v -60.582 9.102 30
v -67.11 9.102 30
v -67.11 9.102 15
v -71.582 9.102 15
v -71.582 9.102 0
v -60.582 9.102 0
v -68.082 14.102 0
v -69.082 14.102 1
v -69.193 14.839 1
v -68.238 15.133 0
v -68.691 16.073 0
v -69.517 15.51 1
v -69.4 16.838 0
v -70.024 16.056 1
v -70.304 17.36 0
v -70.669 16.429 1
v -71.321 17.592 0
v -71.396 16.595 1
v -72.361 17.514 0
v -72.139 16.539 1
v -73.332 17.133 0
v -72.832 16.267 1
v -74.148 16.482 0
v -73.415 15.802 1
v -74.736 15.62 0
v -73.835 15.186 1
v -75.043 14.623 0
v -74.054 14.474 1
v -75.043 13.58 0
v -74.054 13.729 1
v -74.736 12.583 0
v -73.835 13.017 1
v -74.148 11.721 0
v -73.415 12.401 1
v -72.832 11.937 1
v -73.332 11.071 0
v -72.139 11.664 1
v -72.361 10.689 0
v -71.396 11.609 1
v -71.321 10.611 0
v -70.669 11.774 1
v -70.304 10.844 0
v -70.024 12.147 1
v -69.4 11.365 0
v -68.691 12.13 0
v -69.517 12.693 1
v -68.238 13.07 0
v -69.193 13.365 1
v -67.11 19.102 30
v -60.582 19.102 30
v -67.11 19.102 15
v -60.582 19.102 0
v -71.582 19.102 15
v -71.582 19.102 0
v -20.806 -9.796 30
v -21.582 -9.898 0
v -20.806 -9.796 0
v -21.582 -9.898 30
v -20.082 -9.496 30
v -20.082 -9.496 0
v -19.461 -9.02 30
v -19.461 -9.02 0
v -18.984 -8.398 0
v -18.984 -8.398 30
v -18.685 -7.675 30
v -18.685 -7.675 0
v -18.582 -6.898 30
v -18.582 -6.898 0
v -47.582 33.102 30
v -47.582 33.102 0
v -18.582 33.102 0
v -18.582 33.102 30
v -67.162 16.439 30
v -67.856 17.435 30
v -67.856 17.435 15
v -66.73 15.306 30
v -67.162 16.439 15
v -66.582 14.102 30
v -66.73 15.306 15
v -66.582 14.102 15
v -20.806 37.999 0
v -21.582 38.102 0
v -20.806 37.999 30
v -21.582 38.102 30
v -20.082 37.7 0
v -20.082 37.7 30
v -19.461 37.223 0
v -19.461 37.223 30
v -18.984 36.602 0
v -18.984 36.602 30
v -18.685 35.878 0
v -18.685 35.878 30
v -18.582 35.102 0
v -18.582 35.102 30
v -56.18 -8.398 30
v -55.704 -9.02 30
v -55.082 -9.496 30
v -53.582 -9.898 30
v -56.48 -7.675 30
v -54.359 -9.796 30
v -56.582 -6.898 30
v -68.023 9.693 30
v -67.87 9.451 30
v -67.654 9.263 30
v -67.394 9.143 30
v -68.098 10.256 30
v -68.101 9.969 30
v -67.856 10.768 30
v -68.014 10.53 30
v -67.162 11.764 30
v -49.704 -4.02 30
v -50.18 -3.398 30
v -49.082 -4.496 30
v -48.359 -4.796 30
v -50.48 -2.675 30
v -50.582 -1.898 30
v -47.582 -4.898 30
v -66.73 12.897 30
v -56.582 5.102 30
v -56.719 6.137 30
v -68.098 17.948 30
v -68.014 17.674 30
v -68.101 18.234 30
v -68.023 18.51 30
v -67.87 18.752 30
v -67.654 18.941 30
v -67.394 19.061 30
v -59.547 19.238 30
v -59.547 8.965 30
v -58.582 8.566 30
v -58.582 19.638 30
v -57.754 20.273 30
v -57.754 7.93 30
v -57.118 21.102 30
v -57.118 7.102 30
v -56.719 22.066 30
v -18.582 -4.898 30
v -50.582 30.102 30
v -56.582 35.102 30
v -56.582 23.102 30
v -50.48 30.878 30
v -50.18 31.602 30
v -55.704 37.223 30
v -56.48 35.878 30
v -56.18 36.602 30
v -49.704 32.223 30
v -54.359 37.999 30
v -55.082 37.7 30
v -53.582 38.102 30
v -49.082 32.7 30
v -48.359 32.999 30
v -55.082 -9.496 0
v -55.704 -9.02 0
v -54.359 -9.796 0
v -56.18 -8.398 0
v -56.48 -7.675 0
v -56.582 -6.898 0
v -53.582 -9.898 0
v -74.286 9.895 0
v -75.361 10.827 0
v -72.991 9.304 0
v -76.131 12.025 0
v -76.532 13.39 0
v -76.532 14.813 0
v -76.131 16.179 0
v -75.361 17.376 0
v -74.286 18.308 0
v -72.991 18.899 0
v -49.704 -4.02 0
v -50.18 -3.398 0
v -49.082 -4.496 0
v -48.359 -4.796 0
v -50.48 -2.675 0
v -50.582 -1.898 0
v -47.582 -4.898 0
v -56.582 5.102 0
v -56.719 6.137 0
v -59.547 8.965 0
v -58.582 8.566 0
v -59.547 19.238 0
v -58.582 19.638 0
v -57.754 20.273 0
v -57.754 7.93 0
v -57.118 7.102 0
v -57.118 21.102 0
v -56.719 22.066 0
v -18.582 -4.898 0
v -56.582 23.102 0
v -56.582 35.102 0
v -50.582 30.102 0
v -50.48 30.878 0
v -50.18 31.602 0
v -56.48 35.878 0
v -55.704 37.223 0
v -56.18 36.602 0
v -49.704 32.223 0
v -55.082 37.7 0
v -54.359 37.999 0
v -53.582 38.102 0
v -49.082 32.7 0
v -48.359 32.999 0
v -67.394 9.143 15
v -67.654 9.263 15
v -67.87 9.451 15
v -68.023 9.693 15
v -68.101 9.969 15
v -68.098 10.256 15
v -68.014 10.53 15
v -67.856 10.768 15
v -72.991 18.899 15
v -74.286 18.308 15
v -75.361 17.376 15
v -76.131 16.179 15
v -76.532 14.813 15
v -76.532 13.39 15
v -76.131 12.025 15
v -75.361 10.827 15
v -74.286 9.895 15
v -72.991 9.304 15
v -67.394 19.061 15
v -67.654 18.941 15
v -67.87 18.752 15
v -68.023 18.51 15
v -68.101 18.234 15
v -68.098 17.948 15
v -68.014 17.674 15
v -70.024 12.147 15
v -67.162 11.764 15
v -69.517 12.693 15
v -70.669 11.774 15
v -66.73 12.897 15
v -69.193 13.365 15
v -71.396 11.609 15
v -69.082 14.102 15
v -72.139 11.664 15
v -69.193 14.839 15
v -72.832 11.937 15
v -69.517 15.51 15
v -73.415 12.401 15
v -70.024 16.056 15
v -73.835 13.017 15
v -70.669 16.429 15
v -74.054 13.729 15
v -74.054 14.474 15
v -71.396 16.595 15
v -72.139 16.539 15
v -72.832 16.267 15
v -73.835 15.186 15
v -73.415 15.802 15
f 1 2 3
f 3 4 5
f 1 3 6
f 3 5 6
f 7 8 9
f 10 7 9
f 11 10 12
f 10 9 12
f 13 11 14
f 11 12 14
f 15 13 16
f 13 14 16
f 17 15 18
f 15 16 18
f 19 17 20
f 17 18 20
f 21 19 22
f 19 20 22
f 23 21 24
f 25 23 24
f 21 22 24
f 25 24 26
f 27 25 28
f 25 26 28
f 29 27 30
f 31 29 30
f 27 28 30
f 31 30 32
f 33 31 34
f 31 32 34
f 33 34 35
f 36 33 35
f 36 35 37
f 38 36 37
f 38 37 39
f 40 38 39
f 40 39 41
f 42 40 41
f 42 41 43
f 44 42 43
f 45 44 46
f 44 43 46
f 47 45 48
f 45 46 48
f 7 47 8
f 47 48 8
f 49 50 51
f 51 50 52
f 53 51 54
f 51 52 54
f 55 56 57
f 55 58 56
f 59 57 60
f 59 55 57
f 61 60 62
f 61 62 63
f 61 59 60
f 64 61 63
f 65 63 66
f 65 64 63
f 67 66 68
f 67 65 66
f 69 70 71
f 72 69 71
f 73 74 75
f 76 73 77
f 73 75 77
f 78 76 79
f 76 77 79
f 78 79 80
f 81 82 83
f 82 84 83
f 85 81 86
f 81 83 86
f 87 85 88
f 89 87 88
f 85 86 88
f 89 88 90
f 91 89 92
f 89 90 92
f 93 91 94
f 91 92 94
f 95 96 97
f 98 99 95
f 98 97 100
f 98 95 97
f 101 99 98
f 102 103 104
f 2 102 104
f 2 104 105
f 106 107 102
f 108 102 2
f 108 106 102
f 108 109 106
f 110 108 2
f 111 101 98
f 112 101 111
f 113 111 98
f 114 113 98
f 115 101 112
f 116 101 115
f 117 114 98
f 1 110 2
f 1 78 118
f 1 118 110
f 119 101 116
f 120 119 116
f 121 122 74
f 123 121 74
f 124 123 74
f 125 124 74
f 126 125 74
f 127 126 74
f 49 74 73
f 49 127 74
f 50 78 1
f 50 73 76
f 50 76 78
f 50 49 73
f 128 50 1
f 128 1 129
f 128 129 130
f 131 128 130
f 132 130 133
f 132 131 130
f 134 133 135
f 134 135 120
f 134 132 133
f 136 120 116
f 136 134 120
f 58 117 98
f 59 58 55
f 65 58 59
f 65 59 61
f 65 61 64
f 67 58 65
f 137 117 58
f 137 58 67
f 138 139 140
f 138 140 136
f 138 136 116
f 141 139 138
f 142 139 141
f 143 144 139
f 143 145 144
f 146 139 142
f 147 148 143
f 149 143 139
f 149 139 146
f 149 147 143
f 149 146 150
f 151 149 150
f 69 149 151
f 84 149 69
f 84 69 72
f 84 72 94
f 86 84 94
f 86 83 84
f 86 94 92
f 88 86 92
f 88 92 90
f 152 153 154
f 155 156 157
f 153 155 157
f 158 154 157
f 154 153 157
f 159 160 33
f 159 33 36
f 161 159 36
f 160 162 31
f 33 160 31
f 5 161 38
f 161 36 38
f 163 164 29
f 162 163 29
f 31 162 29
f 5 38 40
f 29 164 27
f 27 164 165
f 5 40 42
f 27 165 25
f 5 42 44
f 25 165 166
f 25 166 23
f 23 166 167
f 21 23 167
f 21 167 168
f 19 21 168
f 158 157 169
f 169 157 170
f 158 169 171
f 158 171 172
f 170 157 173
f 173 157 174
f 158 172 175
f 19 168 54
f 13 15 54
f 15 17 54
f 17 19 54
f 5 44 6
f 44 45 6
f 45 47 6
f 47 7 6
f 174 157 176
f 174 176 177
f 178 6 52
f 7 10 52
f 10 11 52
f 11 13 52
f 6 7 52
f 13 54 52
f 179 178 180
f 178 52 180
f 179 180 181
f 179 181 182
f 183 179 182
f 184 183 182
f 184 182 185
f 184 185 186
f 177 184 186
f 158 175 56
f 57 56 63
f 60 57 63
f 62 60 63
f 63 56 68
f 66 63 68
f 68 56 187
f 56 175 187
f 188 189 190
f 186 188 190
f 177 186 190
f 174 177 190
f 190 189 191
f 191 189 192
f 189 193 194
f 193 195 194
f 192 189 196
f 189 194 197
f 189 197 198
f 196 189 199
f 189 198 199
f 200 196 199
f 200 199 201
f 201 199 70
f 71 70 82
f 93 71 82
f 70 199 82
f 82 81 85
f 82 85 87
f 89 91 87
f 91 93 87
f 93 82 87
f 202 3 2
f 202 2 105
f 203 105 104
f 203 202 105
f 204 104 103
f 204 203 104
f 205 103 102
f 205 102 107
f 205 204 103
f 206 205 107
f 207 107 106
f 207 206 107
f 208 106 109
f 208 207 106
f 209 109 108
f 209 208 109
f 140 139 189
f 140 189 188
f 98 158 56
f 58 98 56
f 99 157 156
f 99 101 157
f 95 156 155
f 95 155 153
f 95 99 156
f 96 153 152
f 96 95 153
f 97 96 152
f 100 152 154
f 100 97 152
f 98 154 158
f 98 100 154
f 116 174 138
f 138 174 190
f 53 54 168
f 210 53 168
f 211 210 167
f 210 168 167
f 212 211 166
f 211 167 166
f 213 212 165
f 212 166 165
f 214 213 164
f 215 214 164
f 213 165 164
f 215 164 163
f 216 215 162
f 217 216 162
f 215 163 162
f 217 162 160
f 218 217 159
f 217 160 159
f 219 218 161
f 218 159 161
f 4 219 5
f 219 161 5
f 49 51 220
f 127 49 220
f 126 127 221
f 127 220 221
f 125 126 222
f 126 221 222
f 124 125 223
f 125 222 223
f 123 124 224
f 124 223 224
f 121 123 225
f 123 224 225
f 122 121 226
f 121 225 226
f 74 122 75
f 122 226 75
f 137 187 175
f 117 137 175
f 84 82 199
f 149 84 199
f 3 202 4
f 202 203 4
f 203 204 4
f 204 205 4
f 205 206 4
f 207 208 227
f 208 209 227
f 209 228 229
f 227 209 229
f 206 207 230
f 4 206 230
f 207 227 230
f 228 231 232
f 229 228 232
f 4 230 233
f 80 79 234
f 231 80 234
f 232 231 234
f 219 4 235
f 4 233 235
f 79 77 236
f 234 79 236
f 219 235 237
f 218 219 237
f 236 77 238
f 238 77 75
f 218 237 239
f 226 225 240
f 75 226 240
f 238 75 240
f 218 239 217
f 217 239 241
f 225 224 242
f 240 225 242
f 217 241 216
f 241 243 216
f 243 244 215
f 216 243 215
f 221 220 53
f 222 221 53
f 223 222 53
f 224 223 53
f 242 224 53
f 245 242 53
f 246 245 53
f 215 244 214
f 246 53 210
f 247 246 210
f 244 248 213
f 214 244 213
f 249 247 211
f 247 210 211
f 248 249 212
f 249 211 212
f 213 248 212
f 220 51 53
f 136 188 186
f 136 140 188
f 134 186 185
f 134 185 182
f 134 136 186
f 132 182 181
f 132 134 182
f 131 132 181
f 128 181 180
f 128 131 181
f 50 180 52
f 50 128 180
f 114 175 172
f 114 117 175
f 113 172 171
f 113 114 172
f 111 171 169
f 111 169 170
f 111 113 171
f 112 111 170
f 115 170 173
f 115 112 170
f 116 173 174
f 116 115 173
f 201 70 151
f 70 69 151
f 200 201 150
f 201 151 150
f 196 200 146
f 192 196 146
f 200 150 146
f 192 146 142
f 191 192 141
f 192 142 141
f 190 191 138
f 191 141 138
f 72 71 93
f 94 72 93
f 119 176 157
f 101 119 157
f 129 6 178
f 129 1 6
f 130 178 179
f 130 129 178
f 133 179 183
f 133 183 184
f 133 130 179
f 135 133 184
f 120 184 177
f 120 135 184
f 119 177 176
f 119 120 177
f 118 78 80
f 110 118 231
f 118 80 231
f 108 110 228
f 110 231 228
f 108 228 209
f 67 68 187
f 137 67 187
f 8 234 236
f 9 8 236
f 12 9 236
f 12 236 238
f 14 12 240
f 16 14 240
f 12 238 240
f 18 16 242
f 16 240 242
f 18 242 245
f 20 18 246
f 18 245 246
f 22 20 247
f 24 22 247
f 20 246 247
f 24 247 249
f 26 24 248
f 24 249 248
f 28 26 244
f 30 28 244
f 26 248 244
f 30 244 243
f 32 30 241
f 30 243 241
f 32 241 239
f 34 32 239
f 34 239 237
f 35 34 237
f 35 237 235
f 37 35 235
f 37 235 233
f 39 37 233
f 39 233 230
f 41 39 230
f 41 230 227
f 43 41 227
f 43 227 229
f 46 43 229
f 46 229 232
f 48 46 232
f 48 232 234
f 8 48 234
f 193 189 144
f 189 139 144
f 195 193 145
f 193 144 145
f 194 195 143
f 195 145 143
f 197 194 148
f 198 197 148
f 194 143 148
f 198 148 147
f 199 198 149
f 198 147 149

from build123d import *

# Parameters (mm, degrees)
F1_DEPTH    = 30
F2_DEPTH    = 30
F3_DEPTH    = 15
F4_R        = 2.5
F5_DEPTH    = 25
F6_R        = 3
F7_R        = 4
F8_T1_DEPTH = 26.1803398875
F9_SIZE     = 1


# Not quite as in the source:
# - a fillet or chamfer that OpenCascade refuses, or shapes differently, is made with other operations: its cross-section is extruded or revolved along the edge and cut away or added


with BuildPart() as f1:
    # F0 (on Top) → F1 (new body)
    with BuildSketch(Plane.XY):
        with BuildLine():
            ThreePointArc((-71.5824067593, 19.101677686), (-68.0468728533, 17.6372115919), (-66.5824067593, 14.101677686))
            ThreePointArc((-66.5824067593, 14.101677686), (-68.0468728533, 10.56614378), (-71.5824067593, 9.101677686))
            Line((-71.5824067593, 9.101677686), (-56.5824067593, 9.101677686))
            Line((-56.5824067593, 9.101677686), (-56.5824067593, 19.101677686))
            Line((-56.5824067593, 19.101677686), (-71.5824067593, 19.101677686))
        make_face()
    extrude(amount=F1_DEPTH)

    # F0 (on Top) → F2 (join)
    with BuildSketch(Plane.XY):
        Polygon((-56.5824067593, 38.101677686), (-56.5824067593, 33.101677686), (-50.5824067593, 33.101677686), (-18.5824067593, 33.101677686), (-18.5824067593, 38.101677686), align=None)
        Polygon((-56.5824067593, 33.101677686), (-56.5824067593, 19.101677686), (-56.5824067593, 9.101677686), (-56.5824067593, -4.898322314), (-50.5824067593, -4.898322314), (-50.5824067593, 33.101677686), align=None)
        Polygon((-50.5824067593, -4.898322314), (-56.5824067593, -4.898322314), (-56.5824067593, -9.898322314), (-18.5824067593, -9.898322314), (-18.5824067593, -4.898322314), align=None)
    extrude(amount=F2_DEPTH)

    # F0 (on Top) → F3 (join)
    with BuildSketch(Plane.XY):
        with BuildLine():
            ThreePointArc((-71.5824067593, 9.101677686), (-68.0468728533, 10.56614378), (-66.5824067593, 14.101677686))
            ThreePointArc((-66.5824067593, 14.101677686), (-68.0468728533, 17.6372115919), (-71.5824067593, 19.101677686))
            Line((-71.5824067593, 19.101677686), (-71.5824067593, 9.101677686))
        make_face()
        with BuildLine():
            Line((-71.5824067593, 9.101677686), (-71.5824067593, 19.101677686))
            ThreePointArc((-71.5824067593, 19.101677686), (-76.5824067593, 14.101677686), (-71.5824067593, 9.101677686))
        make_face()
    extrude(amount=F3_DEPTH)

    # F4 (on face) → F5 (cut)
    with BuildSketch(Plane.XY.offset(15)):
        with Locations((-71.5824067593, 14.101677686)):
            Circle(F4_R)
    extrude(amount=-F5_DEPTH, mode=Mode.SUBTRACT)

    # F6
    f6_edges = [f1.edges().sort_by_distance(p)[0] for p in [
        (-18.582407, -9.898322, 15),
        (-18.582407, 38.101678, 15),
        (-50.582407, 33.101678, 15),
        (-50.582407, -4.898322, 15),
        (-56.582407, -9.898322, 15),
        (-56.582407, 38.101678, 15),
    ]]
    fillet(f6_edges, radius=F6_R)

    # F7
    f7_edges = [f1.edges().sort_by_distance(p)[0] for p in [
        (-56.582407, 9.101678, 15),
        (-56.582407, 19.101678, 15),
    ]]
    fillet(f7_edges, radius=F7_R)

    # F8: fillet of radius 1 on 4 edges, made by hand

    # F8_s2 → F8_t1 (cut)
    with BuildSketch(Plane.XY.offset(15)):
        with BuildLine():
            ThreePointArc((-67.1102708043, 19.101677686), (-68.0231417334, 18.5099259764), (-67.8556267968, 17.4350110193))
            ThreePointArc((-67.8556267968, 17.4350110193), (-69.5411653069, 18.6660323319), (-71.5824067593, 19.101677686))
            Line((-71.5824067593, 19.101677686), (-67.1102708043, 19.101677686))
        make_face()
        with BuildLine():
            ThreePointArc((-67.1102708043, 9.101677686), (-68.0231417334, 9.6934293955), (-67.8556267968, 10.7683443526))
            ThreePointArc((-67.8556267968, 10.7683443526), (-69.5411653069, 9.5373230401), (-71.5824067593, 9.101677686))
            Line((-71.5824067593, 9.101677686), (-67.1102708043, 9.101677686))
        make_face()
    extrude(amount=F8_T1_DEPTH, mode=Mode.SUBTRACT)

    # F9
    f9_edges = [f1.edges().sort_by_distance(p)[0] for p in [
        (-74.082407, 14.101678, 0),
    ]]
    chamfer(f9_edges, length=F9_SIZE)


solid = f1.part
